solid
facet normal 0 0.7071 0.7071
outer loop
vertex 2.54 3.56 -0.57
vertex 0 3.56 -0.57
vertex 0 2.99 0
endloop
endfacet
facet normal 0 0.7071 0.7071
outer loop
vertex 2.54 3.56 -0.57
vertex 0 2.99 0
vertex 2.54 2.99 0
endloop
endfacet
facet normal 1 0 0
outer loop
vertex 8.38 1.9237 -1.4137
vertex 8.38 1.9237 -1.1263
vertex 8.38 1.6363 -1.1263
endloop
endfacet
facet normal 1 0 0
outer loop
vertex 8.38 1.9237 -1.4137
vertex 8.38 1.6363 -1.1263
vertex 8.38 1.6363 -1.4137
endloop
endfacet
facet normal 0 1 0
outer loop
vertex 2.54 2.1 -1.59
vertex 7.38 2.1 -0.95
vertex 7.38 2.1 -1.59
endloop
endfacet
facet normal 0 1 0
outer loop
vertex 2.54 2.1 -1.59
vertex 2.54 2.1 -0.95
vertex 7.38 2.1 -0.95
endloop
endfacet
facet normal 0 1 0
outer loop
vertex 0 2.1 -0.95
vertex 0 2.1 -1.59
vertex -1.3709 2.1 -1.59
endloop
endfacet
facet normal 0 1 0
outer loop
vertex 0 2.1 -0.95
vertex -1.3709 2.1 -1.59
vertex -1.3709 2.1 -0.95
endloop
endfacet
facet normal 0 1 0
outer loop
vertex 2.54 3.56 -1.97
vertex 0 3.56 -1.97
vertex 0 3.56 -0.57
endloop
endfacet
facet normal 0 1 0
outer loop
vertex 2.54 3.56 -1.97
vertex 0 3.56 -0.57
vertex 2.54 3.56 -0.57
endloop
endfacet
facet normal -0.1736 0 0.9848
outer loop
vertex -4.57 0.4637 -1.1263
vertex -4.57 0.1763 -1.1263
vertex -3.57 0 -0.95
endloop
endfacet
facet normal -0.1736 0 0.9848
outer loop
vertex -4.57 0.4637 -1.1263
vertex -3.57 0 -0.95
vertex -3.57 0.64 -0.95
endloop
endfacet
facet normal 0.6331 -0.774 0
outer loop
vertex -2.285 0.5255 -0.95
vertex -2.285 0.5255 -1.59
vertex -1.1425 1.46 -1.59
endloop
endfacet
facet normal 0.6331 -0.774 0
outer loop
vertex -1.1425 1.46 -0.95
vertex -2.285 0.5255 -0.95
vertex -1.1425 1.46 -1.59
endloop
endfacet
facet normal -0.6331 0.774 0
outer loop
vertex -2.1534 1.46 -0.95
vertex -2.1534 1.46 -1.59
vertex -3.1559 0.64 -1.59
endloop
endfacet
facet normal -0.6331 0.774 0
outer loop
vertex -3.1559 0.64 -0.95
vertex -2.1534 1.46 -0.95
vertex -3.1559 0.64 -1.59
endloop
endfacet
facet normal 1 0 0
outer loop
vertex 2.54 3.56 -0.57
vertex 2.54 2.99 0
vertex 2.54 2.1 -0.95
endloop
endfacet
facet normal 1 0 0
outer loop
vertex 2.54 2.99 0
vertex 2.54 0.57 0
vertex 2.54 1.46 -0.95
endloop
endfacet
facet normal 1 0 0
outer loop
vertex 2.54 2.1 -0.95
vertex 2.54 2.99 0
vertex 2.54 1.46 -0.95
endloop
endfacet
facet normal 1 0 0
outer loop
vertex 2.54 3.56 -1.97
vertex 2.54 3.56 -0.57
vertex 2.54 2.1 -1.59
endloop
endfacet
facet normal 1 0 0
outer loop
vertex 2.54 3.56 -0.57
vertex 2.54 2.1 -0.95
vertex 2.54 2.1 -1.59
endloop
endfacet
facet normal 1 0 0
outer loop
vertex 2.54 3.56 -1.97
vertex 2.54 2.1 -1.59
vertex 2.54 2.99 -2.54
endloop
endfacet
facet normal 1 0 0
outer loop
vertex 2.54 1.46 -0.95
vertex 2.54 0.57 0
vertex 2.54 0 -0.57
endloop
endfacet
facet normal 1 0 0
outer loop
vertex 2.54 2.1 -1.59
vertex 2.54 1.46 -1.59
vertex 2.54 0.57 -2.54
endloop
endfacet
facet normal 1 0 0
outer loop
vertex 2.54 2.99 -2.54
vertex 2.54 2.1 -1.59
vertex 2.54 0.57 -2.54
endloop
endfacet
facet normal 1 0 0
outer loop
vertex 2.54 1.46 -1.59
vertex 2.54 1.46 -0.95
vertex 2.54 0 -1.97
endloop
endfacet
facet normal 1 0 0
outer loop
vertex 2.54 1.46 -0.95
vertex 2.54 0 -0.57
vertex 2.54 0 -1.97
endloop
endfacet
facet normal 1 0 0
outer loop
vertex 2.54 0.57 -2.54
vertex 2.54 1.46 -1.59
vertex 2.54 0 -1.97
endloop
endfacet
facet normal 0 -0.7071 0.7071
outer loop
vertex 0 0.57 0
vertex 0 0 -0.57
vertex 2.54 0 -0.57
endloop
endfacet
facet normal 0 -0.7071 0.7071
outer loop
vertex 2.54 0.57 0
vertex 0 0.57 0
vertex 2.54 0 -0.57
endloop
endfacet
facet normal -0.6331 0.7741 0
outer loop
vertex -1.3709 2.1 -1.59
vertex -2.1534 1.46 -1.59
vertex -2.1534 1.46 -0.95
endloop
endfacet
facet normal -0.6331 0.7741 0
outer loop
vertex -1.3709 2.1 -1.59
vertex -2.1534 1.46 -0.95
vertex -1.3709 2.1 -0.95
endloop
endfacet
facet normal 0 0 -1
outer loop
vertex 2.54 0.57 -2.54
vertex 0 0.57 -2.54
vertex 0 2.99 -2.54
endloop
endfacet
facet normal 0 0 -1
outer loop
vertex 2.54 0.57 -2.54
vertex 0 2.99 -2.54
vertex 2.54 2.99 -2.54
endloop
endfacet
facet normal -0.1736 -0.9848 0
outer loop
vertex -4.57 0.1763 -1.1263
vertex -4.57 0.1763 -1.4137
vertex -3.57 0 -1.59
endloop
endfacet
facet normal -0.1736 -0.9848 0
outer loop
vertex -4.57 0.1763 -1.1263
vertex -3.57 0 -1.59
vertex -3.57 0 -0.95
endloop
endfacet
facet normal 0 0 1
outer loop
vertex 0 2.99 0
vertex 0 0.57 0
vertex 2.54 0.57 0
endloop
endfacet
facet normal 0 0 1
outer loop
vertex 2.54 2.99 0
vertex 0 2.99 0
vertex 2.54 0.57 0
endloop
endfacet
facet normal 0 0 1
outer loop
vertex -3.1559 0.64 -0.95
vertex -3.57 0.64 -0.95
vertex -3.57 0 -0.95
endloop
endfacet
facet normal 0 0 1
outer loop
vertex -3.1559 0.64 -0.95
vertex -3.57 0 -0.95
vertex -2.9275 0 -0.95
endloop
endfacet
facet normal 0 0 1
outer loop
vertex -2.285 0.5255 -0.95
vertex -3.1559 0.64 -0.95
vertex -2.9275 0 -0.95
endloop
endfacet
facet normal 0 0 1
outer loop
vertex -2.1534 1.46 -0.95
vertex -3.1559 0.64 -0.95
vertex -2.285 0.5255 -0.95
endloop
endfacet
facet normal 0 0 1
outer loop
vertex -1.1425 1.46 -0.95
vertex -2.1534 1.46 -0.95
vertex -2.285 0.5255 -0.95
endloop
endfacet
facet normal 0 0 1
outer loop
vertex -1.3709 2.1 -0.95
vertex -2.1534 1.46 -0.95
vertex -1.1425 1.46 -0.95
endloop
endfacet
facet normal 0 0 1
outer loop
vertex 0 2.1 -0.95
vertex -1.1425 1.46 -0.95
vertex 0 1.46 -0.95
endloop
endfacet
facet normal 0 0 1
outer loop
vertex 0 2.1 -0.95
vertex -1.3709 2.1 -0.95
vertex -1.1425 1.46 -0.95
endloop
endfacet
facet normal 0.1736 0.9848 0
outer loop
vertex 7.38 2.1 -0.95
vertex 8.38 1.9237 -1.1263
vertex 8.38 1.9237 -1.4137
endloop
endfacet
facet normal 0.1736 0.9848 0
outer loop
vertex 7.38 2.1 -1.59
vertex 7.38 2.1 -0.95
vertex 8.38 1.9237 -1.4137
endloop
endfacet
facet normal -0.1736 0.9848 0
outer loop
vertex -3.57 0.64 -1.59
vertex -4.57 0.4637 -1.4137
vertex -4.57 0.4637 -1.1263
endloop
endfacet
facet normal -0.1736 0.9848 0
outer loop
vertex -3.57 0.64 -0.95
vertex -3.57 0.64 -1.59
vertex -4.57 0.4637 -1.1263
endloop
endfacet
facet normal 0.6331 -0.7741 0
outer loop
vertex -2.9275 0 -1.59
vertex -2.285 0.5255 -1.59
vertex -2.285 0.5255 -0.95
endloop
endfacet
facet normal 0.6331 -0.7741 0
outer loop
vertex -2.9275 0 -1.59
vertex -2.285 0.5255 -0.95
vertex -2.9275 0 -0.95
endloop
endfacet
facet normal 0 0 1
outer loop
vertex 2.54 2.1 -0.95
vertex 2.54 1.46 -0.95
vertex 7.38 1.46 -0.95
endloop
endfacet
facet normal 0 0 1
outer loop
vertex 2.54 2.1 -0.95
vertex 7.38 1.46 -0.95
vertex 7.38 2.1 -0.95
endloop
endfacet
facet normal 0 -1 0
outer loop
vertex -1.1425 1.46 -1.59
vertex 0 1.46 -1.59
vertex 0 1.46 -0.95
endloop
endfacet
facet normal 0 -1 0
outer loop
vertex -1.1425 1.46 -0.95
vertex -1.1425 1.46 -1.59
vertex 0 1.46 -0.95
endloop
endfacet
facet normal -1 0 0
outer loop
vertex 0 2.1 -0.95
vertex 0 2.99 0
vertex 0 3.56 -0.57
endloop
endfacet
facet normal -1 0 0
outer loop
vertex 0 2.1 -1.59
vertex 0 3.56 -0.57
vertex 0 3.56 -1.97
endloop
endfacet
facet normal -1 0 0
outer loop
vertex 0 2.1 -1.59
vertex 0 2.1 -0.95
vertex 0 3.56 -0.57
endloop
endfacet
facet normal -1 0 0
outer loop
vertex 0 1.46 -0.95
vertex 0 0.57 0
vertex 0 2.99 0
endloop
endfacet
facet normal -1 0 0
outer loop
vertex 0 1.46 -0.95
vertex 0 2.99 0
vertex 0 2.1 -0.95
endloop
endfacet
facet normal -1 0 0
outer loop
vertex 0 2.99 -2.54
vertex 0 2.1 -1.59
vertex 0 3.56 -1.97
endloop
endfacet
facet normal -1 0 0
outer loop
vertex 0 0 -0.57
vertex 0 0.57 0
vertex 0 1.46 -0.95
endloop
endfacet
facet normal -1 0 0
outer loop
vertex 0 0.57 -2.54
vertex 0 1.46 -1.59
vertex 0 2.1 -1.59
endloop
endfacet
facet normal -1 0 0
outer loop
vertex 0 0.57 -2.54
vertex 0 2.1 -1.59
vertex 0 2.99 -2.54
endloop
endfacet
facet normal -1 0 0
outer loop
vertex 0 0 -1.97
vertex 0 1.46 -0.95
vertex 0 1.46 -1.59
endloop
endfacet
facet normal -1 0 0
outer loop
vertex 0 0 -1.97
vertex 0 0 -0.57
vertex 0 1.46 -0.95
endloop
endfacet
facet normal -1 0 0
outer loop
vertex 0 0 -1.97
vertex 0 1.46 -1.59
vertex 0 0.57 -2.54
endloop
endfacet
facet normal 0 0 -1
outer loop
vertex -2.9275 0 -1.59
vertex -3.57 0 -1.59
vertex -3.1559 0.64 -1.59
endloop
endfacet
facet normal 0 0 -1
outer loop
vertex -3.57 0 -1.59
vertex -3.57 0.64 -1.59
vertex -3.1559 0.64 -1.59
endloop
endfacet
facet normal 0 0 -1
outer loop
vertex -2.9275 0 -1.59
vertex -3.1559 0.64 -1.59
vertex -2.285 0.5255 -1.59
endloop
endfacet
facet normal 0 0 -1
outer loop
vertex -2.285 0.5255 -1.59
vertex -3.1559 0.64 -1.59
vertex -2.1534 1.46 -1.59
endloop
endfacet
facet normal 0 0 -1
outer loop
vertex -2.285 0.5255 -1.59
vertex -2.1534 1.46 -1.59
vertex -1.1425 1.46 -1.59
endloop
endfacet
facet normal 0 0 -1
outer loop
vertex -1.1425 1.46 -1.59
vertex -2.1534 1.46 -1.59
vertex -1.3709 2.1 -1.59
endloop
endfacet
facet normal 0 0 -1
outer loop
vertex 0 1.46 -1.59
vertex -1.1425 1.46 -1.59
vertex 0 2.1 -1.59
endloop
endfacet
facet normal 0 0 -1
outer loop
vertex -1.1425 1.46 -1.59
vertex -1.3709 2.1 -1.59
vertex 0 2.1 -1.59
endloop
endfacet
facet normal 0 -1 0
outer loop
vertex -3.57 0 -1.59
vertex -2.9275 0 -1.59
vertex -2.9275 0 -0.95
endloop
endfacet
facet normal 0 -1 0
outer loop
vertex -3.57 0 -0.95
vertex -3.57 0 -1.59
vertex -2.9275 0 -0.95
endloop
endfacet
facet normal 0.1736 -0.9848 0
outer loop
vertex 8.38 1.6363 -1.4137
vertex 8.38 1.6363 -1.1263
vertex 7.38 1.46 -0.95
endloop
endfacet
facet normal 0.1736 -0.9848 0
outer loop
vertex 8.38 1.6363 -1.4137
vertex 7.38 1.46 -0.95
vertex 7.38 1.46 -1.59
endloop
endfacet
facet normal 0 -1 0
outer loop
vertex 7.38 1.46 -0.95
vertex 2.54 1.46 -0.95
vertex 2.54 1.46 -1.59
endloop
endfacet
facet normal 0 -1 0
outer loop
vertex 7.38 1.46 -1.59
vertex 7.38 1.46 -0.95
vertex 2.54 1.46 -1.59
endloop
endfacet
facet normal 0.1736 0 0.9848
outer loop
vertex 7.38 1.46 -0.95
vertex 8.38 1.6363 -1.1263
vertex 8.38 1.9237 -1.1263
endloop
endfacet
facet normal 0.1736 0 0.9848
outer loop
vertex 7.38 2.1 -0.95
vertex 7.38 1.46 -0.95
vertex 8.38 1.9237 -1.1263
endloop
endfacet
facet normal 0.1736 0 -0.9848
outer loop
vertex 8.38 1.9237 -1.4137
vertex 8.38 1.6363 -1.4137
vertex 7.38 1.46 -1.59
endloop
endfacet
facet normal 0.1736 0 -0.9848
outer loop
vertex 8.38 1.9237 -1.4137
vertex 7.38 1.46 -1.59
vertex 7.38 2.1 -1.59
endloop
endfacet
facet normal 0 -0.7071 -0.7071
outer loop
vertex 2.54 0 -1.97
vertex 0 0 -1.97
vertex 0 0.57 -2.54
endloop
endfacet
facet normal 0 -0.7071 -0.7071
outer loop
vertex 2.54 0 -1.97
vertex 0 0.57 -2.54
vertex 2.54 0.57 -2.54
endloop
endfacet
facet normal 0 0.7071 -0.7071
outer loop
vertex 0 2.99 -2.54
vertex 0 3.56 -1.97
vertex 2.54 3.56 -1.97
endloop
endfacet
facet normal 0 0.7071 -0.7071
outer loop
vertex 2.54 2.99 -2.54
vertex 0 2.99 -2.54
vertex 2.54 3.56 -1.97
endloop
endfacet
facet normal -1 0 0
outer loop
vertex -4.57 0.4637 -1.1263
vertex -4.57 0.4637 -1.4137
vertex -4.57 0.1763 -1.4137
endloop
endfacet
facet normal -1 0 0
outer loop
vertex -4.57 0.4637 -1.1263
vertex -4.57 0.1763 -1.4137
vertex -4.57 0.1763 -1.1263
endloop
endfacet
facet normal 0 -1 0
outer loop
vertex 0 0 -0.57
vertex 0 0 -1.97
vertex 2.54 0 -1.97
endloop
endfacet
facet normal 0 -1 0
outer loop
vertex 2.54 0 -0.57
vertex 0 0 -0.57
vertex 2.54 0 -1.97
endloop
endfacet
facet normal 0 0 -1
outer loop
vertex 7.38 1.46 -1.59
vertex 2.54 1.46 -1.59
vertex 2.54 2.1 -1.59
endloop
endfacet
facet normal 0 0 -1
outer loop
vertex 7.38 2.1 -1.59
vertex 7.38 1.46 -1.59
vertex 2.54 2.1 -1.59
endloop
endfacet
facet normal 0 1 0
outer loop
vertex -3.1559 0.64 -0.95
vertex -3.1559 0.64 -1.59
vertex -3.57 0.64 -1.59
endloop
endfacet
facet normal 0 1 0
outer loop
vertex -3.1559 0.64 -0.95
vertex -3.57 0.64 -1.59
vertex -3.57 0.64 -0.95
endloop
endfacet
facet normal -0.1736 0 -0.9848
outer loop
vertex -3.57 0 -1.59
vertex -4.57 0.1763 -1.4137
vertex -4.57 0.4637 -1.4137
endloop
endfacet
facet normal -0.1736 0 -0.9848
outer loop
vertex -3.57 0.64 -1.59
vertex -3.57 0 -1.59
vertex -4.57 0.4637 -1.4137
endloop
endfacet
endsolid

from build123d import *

# Parameters (mm, degrees)
SKETCH1_W               = 2.54
SKETCH1_H               = 2.54
BOSS_EXTRUDE1_DEPTH     = 3.56
SKETCH2_W               = 0.64
SKETCH2_H               = 0.64
BOSS_EXTRUDE2_DEPTH     = 5.84
CHAMFER1_SIZE           = 0.57
CHAMFER2_SIZE           = 1
CHAMFER2_SIZE2          = 0.176326981
CHAMFER2_PART_2_SIZE    = 1
CHAMFER2_PART_2_SIZE2   = 0.176326981
CHAMFER2_PART_3_SIZE    = 1
CHAMFER2_PART_3_SIZE2   = 0.176326981
CHAMFER2_PART_4_SIZE    = 1
CHAMFER2_PART_4_SIZE2   = 0.176326981
SKETCH3_W               = 0.64
SKETCH3_H               = 0.64
BOSS_EXTRUDE3_DEPTH     = 2.285
SKETCH4_W               = 0.64
SKETCH4_H               = 0.64
BOSS_EXTRUDE4_DEPTH     = 2.285
CHAMFER3_SIZE           = 1
CHAMFER3_SIZE2          = 0.176326981
CHAMFER3_PART_2_SIZE    = 1
CHAMFER3_PART_2_SIZE2   = 0.176326981
CHAMFER3_PART_3_SIZE    = 1
CHAMFER3_PART_3_SIZE2   = 0.176326981
CHAMFER3_PART_4_SIZE    = 1
CHAMFER3_PART_4_SIZE2   = 0.176326981
BOSS_EXTRUDE5_DEPTH     = 0.64
CUT_EXTRUDE1_DEPTH      = 1.95
CUT_EXTRUDE1_DEPTH_BACK = 2.59


with BuildPart() as part:
    # Sketch1 → Boss-Extrude1 (new body)
    with BuildSketch(Plane(origin=(0, 0, 0), x_dir=(1, 0, 0), z_dir=(0, 1, 0))):
        with Locations((1.27, 1.27)):
            Rectangle(SKETCH1_W, SKETCH1_H)
    extrude(amount=BOSS_EXTRUDE1_DEPTH)

    # Sketch2 → Boss-Extrude2 (add)
    with BuildSketch(Plane(origin=(2.54, 0, 0), x_dir=(0, 0, -1), z_dir=(1, 0, 0))):
        with Locations((1.27, 1.78)):
            Rectangle(SKETCH2_W, SKETCH2_H)
    extrude(amount=BOSS_EXTRUDE2_DEPTH)

    # Chamfer1
    chamfer1_edges = [part.edges().sort_by_distance(p)[0] for p in [
        (1.27, 3.56, -2.54),
        (1.27, 0, -2.54),
        (1.27, 0, 0),
        (1.27, 3.56, 0),
    ]]
    chamfer(chamfer1_edges, length=CHAMFER1_SIZE)

    # Chamfer2
    chamfer2_edges = [part.edges().sort_by_distance(p)[0] for p in [
        (8.38, 1.78, -0.95),
    ]]
    chamfer2_side = [part.faces().sort_by_distance(p)[0] for p in [
        (5.46, 1.78, -0.95),
    ]]
    chamfer(chamfer2_edges, length=CHAMFER2_SIZE, length2=CHAMFER2_SIZE2, reference=chamfer2_side[0])

    # Chamfer2 part 2
    chamfer2_part_2_edges = [part.edges().sort_by_distance(p)[0] for p in [
        (8.38, 1.46, -1.27),
    ]]
    chamfer2_part_2_side = [part.faces().sort_by_distance(p)[0] for p in [
        (5.46, 1.46, -1.27),
    ]]
    chamfer(chamfer2_part_2_edges, length=CHAMFER2_PART_2_SIZE, length2=CHAMFER2_PART_2_SIZE2, reference=chamfer2_part_2_side[0])

    # Chamfer2 part 3
    chamfer2_part_3_edges = [part.edges().sort_by_distance(p)[0] for p in [
        (8.38, 1.78, -1.59),
    ]]
    chamfer2_part_3_side = [part.faces().sort_by_distance(p)[0] for p in [
        (5.46, 1.78, -1.59),
    ]]
    chamfer(chamfer2_part_3_edges, length=CHAMFER2_PART_3_SIZE, length2=CHAMFER2_PART_3_SIZE2, reference=chamfer2_part_3_side[0])

    # Chamfer2 part 4
    chamfer2_part_4_edges = [part.edges().sort_by_distance(p)[0] for p in [
        (8.38, 2.1, -1.27),
    ]]
    chamfer2_part_4_side = [part.faces().sort_by_distance(p)[0] for p in [
        (5.46, 2.1, -1.27),
    ]]
    chamfer(chamfer2_part_4_edges, length=CHAMFER2_PART_4_SIZE, length2=CHAMFER2_PART_4_SIZE2, reference=chamfer2_part_4_side[0])

    # Sketch3 → Boss-Extrude3 (add)
    with BuildSketch(Plane.ZY):
        with Locations((-1.27, 1.78)):
            Rectangle(SKETCH3_W, SKETCH3_H)
    extrude(amount=BOSS_EXTRUDE3_DEPTH)



with BuildPart() as body_2:
    # Sketch4 → Boss-Extrude4 (new body)
    with BuildSketch(Plane.ZY.offset(2.285)):
        with Locations((-1.27, 0.32)):
            Rectangle(SKETCH4_W, SKETCH4_H)
    extrude(amount=BOSS_EXTRUDE4_DEPTH)

    # Chamfer3
    chamfer3_edges = [body_2.edges().sort_by_distance(p)[0] for p in [
        (-4.57, 0.32, -1.59),
    ]]
    chamfer3_side = [body_2.faces().sort_by_distance(p)[0] for p in [
        (-3.4275, 0.32, -1.59),
    ]]
    chamfer(chamfer3_edges, length=CHAMFER3_SIZE, length2=CHAMFER3_SIZE2, reference=chamfer3_side[0])

    # Chamfer3 part 2
    chamfer3_part_2_edges = [body_2.edges().sort_by_distance(p)[0] for p in [
        (-4.57, 0, -1.27),
    ]]
    chamfer3_part_2_side = [body_2.faces().sort_by_distance(p)[0] for p in [
        (-3.4275, 0, -1.27),
    ]]
    chamfer(chamfer3_part_2_edges, length=CHAMFER3_PART_2_SIZE, length2=CHAMFER3_PART_2_SIZE2, reference=chamfer3_part_2_side[0])

    # Chamfer3 part 3
    chamfer3_part_3_edges = [body_2.edges().sort_by_distance(p)[0] for p in [
        (-4.57, 0.32, -0.95),
    ]]
    chamfer3_part_3_side = [body_2.faces().sort_by_distance(p)[0] for p in [
        (-3.4275, 0.32, -0.95),
    ]]
    chamfer(chamfer3_part_3_edges, length=CHAMFER3_PART_3_SIZE, length2=CHAMFER3_PART_3_SIZE2, reference=chamfer3_part_3_side[0])

    # Chamfer3 part 4
    chamfer3_part_4_edges = [body_2.edges().sort_by_distance(p)[0] for p in [
        (-4.57, 0.64, -1.27),
    ]]
    chamfer3_part_4_side = [body_2.faces().sort_by_distance(p)[0] for p in [
        (-3.4275, 0.64, -1.27),
    ]]
    chamfer(chamfer3_part_4_edges, length=CHAMFER3_PART_4_SIZE, length2=CHAMFER3_PART_4_SIZE2, reference=chamfer3_part_4_side[0])


with BuildPart() as part_1:
    add(part.part)

    add(body_2.part)  # Boss-Extrude5 merges body 2
    # Sketch5 → Boss-Extrude5 (add)
    with BuildSketch(Plane(origin=(0, 0, -1.59), x_dir=(-1, 0, 0), z_dir=(0, 0, -1))):
        Polygon((2.285, 0.525518207), (1.1425, 1.46), (2.153367279, 1.46), (3.155901525, 0.64), (2.285, 0.64), align=None)
    extrude(amount=-BOSS_EXTRUDE5_DEPTH)

    # Sketch6 → Cut-Extrude1 (cut, two sides)
    with BuildSketch(Plane(origin=(0, 0, -1.59), x_dir=(-1, 0, 0), z_dir=(0, 0, -1))) as cut_extrude1_sk:
        Polygon((2.153367279, 1.46), (1.370901525, 2.1), (2.285, 2.1), (2.285, 1.46), align=None)
        Polygon((2.285, 0.525518207), (2.9275, 0), (2.285, 0), align=None)
    extrude(amount=CUT_EXTRUDE1_DEPTH, mode=Mode.SUBTRACT)
    extrude(cut_extrude1_sk.sketch, amount=-CUT_EXTRUDE1_DEPTH_BACK, mode=Mode.SUBTRACT)


solid = part_1.part
